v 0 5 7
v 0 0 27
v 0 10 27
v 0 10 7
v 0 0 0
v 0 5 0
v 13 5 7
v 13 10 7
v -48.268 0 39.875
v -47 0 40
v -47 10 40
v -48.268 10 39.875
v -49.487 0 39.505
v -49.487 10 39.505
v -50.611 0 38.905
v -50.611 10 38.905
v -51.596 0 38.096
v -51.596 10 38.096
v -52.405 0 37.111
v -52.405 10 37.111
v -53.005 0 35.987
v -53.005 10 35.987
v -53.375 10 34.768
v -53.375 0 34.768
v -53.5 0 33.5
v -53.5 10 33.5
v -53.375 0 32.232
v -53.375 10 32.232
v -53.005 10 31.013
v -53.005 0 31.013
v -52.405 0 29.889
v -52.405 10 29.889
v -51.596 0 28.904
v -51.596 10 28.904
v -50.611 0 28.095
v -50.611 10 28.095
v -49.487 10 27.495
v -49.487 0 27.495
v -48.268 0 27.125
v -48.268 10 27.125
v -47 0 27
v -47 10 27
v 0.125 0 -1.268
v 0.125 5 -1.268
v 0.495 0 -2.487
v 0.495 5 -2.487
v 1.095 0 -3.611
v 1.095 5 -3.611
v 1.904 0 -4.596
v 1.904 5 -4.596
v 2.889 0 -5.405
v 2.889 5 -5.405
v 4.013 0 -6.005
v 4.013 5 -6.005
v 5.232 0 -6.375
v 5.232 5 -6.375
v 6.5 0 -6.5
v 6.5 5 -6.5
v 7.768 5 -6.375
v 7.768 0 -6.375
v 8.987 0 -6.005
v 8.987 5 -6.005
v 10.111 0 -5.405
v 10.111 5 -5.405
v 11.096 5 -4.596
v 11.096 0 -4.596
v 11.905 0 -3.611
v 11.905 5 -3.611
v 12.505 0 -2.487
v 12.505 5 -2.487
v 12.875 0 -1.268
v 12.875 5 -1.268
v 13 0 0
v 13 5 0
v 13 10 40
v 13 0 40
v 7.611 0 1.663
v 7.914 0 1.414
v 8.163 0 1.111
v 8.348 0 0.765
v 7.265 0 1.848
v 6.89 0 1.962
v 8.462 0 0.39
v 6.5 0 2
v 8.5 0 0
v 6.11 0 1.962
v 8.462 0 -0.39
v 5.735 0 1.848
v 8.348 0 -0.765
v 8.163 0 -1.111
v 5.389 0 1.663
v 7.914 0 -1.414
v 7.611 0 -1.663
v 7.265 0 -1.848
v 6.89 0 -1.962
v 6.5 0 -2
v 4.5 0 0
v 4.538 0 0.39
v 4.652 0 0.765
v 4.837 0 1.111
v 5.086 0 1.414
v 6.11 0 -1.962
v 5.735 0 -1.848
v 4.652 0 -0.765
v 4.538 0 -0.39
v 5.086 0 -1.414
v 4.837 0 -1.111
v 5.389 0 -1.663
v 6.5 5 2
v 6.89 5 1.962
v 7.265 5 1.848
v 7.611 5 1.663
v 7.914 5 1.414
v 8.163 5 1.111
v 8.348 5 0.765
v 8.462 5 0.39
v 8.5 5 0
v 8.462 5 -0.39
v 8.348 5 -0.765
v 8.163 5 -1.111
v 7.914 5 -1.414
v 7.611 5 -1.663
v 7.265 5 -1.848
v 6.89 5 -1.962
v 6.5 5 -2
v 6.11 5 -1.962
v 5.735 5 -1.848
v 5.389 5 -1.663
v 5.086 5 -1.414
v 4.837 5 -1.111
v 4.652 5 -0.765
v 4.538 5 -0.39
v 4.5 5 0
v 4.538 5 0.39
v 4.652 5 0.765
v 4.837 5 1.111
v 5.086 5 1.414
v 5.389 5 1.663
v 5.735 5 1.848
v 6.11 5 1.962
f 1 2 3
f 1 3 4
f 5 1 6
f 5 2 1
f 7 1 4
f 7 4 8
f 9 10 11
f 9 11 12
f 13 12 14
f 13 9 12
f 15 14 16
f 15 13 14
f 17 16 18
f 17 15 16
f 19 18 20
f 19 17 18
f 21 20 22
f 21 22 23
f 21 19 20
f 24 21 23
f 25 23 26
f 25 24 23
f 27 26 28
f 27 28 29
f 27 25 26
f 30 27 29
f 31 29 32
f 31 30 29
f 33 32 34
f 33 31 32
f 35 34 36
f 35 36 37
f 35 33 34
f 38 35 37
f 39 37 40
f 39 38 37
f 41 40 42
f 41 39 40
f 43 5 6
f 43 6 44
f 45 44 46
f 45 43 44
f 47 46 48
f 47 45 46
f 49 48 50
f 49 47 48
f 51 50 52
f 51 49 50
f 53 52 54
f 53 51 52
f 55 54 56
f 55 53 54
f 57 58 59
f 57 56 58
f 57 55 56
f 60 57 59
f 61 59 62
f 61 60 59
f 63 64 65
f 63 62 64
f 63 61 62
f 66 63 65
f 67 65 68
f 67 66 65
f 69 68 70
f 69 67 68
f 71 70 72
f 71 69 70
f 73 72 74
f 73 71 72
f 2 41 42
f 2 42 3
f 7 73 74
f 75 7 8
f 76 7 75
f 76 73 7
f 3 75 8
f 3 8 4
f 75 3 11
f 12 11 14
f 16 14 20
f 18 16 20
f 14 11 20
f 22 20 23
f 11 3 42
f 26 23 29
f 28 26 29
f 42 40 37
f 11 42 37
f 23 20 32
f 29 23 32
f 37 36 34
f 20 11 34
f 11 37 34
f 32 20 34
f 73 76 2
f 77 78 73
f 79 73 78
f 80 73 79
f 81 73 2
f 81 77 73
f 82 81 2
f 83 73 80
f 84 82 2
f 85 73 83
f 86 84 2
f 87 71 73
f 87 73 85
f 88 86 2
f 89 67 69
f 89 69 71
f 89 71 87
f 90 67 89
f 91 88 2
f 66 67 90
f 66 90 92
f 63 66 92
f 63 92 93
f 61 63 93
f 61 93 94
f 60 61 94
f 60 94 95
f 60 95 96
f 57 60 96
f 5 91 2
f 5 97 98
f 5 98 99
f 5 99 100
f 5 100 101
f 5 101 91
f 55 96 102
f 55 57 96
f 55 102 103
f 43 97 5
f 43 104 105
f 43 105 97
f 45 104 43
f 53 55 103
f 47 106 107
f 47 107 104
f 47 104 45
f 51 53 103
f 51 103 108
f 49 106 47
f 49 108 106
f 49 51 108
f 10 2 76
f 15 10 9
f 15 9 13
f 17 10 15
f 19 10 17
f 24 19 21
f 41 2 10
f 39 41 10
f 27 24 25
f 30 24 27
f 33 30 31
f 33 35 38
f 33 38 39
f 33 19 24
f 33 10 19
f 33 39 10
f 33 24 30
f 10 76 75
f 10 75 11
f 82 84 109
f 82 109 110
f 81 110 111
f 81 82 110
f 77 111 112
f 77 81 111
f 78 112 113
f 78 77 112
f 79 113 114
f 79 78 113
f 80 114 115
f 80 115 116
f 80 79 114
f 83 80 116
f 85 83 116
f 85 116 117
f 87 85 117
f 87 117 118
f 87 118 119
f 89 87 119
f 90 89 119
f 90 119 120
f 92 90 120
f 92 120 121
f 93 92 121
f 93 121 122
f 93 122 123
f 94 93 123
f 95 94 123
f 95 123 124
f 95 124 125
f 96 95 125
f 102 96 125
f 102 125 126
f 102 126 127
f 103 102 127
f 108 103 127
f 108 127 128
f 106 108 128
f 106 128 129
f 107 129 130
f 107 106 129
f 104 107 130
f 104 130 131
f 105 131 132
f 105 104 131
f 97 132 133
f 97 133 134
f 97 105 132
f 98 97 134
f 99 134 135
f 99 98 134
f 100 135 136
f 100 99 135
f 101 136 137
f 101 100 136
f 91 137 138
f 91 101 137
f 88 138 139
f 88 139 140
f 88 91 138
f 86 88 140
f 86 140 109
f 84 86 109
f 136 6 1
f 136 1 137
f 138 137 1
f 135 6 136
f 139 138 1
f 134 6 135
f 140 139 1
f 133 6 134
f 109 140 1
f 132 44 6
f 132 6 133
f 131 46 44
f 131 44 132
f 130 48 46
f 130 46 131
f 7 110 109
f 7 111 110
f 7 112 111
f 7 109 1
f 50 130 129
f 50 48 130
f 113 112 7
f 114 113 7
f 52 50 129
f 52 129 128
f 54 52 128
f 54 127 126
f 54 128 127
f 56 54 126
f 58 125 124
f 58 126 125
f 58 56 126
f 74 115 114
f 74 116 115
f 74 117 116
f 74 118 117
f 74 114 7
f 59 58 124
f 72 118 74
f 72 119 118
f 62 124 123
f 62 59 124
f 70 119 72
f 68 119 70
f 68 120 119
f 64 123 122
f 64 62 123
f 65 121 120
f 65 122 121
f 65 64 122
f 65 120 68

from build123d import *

# Parameters (mm, degrees)
CROQUIS1_R              = 2
SALIENTE_EXTRUIR1_DEPTH = 10
CORTAR_EXTRUIR1_START   = -5
CROQUIS2_R              = 2
CORTAR_EXTRUIR1_DEPTH   = 5


with BuildPart() as part:
    # Croquis1 → Saliente-Extruir1 (new body)
    with BuildSketch(Plane(origin=(0, 0, 0), x_dir=(1, 0, 0), z_dir=(0, 1, 0))):
        with BuildLine():
            Line((13, 0), (13, -40))
            Line((13, -40), (-47, -40))
            ThreePointArc((-47, -40), (-53.5, -33.5), (-47, -27))
            Line((-47, -27), (0, -27))
            Line((0, -27), (0, 0))
            ThreePointArc((0, 0), (6.5, 6.5), (13, 0))
        make_face()
        with Locations(Location((6.5, 0, 0), (0, 0, 270))):
            Circle(CROQUIS1_R, mode=Mode.SUBTRACT)
    extrude(amount=SALIENTE_EXTRUIR1_DEPTH)

    # Croquis2 → Cortar-Extruir1 (cut)
    with BuildSketch(Plane(origin=(0, 10, 0), x_dir=(1, 0, 0), z_dir=(0, 1, 0)).offset(CORTAR_EXTRUIR1_START)):
        with BuildLine():
            Line((0, 0), (0, -7))
            Line((0, -7), (13, -7))
            Line((13, -7), (13, 0))
            ThreePointArc((13, 0), (6.5, 6.5), (0, 0))
        make_face()
        with Locations(Location((6.5, 0, 0), (0, 0, 270))):
            Circle(CROQUIS2_R, mode=Mode.SUBTRACT)
    extrude(amount=CORTAR_EXTRUIR1_DEPTH, mode=Mode.SUBTRACT)


solid = part.part
